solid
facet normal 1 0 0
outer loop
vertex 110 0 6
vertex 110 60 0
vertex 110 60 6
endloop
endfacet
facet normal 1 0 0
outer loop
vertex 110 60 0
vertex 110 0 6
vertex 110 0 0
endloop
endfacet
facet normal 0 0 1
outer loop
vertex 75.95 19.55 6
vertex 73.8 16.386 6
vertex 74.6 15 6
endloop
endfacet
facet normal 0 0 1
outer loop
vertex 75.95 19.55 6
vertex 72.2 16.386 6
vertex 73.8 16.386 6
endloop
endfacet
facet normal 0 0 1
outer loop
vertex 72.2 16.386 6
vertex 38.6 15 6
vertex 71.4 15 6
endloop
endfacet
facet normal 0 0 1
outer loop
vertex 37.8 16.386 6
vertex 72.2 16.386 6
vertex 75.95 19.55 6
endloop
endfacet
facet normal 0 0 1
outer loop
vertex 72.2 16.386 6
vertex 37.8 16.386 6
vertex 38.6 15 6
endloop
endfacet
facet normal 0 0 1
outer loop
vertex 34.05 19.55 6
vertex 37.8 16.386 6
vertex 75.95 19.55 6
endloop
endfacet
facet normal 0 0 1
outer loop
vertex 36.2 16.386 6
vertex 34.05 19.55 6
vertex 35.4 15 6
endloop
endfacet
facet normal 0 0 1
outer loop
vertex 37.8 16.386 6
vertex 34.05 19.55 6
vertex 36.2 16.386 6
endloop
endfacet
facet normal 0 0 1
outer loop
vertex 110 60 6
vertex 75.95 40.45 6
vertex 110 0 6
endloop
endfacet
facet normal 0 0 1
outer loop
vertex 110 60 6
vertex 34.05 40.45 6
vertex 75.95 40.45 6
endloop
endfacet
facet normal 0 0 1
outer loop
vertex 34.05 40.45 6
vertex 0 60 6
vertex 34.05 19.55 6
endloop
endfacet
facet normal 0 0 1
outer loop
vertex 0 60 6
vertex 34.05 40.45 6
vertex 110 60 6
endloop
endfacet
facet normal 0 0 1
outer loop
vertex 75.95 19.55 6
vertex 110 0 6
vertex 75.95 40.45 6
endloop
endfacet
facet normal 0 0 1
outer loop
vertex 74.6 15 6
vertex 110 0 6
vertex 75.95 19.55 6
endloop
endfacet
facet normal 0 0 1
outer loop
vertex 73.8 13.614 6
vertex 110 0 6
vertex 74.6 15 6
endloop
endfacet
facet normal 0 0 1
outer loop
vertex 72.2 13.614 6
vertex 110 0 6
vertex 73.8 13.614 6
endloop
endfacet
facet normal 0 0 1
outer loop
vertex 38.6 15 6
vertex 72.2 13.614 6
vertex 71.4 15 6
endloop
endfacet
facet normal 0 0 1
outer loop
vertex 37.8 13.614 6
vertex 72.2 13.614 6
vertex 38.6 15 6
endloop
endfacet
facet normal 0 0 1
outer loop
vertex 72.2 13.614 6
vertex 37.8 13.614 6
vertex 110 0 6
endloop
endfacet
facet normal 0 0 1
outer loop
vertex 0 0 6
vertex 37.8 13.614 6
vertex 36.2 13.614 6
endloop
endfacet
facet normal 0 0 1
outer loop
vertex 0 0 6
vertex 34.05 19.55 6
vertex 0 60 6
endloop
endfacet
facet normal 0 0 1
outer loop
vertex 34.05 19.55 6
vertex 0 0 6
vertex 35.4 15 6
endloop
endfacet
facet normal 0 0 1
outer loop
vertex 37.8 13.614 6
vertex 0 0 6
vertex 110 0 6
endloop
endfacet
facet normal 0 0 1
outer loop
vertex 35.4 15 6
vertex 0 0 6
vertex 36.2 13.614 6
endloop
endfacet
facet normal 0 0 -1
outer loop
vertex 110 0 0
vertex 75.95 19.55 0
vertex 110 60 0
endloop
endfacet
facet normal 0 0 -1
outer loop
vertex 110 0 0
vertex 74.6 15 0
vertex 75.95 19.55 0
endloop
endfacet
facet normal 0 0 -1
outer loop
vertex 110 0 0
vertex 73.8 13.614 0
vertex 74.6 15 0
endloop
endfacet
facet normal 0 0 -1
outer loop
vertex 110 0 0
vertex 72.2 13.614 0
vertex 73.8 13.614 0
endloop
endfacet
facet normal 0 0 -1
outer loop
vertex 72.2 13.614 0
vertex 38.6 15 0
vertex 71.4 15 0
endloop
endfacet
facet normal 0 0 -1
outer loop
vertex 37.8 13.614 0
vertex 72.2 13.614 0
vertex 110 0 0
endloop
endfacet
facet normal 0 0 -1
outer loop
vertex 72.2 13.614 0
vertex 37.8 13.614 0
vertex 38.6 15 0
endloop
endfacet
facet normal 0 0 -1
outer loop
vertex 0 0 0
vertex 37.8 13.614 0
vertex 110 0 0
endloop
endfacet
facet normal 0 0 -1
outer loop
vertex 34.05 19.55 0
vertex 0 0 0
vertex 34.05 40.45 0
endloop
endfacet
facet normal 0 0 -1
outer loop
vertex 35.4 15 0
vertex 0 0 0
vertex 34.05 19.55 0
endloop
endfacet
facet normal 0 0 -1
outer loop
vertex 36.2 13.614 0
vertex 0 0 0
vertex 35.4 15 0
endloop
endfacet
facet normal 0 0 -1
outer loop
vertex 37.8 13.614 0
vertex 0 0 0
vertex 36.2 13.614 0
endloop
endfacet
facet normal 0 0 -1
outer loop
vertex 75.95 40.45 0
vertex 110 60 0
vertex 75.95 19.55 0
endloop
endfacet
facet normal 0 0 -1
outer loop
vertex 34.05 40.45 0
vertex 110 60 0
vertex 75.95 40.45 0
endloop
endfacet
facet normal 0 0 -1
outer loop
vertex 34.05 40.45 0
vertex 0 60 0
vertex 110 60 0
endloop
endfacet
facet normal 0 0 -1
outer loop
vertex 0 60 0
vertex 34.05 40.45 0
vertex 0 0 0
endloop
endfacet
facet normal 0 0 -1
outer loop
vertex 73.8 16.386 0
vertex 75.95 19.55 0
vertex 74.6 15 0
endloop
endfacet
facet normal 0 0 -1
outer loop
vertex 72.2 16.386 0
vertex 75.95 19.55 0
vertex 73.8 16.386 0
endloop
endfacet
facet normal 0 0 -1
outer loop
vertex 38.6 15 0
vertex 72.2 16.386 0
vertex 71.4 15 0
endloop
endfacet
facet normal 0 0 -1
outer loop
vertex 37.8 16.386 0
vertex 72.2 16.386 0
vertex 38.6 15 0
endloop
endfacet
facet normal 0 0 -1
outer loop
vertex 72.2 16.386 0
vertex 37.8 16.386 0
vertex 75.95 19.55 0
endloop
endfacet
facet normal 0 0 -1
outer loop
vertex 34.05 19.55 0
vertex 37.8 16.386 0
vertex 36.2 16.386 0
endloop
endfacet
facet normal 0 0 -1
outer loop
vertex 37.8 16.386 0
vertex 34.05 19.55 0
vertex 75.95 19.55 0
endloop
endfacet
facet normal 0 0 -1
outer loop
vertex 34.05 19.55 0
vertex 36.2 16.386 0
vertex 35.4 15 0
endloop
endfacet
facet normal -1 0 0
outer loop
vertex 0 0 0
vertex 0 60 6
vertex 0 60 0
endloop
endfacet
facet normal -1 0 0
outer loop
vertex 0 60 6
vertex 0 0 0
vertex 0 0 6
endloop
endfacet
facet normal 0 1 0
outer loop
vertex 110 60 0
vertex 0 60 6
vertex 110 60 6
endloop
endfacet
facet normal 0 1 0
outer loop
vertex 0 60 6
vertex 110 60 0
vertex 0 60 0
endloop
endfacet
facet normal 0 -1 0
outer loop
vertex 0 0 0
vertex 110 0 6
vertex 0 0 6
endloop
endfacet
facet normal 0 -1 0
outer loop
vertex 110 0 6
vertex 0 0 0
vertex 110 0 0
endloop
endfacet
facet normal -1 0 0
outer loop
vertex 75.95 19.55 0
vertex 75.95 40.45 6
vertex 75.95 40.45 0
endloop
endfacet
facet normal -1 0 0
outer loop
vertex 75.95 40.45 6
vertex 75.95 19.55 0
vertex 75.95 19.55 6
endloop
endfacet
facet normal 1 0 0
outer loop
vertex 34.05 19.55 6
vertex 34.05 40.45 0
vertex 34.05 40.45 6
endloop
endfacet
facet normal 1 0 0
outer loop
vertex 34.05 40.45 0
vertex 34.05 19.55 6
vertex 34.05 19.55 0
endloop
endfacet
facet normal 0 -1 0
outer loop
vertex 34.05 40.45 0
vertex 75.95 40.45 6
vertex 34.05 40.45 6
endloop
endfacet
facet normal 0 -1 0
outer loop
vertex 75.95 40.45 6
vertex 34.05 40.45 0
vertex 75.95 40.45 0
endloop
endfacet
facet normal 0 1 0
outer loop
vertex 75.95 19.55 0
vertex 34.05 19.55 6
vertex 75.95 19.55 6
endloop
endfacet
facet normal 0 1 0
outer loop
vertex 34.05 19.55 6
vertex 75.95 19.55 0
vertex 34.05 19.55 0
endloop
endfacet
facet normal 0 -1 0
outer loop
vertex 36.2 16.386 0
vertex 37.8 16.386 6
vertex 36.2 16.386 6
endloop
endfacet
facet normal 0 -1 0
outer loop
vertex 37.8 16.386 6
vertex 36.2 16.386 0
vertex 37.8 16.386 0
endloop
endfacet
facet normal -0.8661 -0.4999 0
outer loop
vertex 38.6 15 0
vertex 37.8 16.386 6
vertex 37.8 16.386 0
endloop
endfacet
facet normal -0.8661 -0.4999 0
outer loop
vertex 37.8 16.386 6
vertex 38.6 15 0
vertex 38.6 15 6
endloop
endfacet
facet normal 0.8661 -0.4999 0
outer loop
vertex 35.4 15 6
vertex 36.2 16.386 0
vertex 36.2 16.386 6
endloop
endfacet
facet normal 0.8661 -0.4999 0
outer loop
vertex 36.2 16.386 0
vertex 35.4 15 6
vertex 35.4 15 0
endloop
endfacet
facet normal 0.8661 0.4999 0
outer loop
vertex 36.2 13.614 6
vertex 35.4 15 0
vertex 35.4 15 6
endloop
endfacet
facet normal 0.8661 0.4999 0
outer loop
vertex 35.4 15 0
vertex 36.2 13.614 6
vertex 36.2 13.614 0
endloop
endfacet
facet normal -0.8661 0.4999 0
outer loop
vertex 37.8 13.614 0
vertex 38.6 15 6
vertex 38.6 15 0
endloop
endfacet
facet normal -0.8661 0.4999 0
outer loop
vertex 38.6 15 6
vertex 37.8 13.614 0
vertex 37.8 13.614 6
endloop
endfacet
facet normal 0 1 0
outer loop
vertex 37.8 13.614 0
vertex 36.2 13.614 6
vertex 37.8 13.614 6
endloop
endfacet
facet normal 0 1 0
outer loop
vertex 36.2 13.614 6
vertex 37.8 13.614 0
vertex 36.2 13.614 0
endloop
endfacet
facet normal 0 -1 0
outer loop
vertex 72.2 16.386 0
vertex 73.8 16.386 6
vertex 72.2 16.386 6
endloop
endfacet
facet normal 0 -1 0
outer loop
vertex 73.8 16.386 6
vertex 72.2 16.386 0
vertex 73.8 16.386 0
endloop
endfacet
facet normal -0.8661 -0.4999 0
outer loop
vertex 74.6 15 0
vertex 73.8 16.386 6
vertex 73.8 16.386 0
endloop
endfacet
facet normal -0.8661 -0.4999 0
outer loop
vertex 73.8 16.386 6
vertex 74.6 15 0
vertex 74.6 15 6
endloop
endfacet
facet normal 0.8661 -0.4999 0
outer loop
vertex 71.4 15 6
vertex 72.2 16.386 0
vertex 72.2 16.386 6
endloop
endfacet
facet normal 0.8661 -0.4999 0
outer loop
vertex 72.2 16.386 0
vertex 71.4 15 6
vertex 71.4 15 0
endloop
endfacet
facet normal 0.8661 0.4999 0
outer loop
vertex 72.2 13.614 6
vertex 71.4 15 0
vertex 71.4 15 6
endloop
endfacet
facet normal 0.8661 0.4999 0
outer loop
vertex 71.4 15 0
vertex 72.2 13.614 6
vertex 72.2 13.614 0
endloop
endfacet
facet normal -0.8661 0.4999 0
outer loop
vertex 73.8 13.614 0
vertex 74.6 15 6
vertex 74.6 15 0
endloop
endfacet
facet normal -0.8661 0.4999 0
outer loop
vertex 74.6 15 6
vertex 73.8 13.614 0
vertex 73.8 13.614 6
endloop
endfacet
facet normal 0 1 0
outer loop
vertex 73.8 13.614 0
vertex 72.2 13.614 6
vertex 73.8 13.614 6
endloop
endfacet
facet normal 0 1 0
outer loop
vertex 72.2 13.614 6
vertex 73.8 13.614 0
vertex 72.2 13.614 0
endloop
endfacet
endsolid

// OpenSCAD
module gr_base() {
  w=110.0; h=60.0; t=6.0;
  difference() {
    cube([w,h,t], center=false);
    translate([(w-40.7-2*0.6)/2, (h-19.7-2*0.6)/2, -1])
      cube([40.7+2*0.6, 19.7+2*0.6, t+2], center=false);
    translate([37.0, 15.0, -1]) cylinder(h=t+2, d=3.2, center=false);
    translate([73.0, 15.0, -1]) cylinder(h=t+2, d=3.2, center=false);
  }
}
gr_base();
